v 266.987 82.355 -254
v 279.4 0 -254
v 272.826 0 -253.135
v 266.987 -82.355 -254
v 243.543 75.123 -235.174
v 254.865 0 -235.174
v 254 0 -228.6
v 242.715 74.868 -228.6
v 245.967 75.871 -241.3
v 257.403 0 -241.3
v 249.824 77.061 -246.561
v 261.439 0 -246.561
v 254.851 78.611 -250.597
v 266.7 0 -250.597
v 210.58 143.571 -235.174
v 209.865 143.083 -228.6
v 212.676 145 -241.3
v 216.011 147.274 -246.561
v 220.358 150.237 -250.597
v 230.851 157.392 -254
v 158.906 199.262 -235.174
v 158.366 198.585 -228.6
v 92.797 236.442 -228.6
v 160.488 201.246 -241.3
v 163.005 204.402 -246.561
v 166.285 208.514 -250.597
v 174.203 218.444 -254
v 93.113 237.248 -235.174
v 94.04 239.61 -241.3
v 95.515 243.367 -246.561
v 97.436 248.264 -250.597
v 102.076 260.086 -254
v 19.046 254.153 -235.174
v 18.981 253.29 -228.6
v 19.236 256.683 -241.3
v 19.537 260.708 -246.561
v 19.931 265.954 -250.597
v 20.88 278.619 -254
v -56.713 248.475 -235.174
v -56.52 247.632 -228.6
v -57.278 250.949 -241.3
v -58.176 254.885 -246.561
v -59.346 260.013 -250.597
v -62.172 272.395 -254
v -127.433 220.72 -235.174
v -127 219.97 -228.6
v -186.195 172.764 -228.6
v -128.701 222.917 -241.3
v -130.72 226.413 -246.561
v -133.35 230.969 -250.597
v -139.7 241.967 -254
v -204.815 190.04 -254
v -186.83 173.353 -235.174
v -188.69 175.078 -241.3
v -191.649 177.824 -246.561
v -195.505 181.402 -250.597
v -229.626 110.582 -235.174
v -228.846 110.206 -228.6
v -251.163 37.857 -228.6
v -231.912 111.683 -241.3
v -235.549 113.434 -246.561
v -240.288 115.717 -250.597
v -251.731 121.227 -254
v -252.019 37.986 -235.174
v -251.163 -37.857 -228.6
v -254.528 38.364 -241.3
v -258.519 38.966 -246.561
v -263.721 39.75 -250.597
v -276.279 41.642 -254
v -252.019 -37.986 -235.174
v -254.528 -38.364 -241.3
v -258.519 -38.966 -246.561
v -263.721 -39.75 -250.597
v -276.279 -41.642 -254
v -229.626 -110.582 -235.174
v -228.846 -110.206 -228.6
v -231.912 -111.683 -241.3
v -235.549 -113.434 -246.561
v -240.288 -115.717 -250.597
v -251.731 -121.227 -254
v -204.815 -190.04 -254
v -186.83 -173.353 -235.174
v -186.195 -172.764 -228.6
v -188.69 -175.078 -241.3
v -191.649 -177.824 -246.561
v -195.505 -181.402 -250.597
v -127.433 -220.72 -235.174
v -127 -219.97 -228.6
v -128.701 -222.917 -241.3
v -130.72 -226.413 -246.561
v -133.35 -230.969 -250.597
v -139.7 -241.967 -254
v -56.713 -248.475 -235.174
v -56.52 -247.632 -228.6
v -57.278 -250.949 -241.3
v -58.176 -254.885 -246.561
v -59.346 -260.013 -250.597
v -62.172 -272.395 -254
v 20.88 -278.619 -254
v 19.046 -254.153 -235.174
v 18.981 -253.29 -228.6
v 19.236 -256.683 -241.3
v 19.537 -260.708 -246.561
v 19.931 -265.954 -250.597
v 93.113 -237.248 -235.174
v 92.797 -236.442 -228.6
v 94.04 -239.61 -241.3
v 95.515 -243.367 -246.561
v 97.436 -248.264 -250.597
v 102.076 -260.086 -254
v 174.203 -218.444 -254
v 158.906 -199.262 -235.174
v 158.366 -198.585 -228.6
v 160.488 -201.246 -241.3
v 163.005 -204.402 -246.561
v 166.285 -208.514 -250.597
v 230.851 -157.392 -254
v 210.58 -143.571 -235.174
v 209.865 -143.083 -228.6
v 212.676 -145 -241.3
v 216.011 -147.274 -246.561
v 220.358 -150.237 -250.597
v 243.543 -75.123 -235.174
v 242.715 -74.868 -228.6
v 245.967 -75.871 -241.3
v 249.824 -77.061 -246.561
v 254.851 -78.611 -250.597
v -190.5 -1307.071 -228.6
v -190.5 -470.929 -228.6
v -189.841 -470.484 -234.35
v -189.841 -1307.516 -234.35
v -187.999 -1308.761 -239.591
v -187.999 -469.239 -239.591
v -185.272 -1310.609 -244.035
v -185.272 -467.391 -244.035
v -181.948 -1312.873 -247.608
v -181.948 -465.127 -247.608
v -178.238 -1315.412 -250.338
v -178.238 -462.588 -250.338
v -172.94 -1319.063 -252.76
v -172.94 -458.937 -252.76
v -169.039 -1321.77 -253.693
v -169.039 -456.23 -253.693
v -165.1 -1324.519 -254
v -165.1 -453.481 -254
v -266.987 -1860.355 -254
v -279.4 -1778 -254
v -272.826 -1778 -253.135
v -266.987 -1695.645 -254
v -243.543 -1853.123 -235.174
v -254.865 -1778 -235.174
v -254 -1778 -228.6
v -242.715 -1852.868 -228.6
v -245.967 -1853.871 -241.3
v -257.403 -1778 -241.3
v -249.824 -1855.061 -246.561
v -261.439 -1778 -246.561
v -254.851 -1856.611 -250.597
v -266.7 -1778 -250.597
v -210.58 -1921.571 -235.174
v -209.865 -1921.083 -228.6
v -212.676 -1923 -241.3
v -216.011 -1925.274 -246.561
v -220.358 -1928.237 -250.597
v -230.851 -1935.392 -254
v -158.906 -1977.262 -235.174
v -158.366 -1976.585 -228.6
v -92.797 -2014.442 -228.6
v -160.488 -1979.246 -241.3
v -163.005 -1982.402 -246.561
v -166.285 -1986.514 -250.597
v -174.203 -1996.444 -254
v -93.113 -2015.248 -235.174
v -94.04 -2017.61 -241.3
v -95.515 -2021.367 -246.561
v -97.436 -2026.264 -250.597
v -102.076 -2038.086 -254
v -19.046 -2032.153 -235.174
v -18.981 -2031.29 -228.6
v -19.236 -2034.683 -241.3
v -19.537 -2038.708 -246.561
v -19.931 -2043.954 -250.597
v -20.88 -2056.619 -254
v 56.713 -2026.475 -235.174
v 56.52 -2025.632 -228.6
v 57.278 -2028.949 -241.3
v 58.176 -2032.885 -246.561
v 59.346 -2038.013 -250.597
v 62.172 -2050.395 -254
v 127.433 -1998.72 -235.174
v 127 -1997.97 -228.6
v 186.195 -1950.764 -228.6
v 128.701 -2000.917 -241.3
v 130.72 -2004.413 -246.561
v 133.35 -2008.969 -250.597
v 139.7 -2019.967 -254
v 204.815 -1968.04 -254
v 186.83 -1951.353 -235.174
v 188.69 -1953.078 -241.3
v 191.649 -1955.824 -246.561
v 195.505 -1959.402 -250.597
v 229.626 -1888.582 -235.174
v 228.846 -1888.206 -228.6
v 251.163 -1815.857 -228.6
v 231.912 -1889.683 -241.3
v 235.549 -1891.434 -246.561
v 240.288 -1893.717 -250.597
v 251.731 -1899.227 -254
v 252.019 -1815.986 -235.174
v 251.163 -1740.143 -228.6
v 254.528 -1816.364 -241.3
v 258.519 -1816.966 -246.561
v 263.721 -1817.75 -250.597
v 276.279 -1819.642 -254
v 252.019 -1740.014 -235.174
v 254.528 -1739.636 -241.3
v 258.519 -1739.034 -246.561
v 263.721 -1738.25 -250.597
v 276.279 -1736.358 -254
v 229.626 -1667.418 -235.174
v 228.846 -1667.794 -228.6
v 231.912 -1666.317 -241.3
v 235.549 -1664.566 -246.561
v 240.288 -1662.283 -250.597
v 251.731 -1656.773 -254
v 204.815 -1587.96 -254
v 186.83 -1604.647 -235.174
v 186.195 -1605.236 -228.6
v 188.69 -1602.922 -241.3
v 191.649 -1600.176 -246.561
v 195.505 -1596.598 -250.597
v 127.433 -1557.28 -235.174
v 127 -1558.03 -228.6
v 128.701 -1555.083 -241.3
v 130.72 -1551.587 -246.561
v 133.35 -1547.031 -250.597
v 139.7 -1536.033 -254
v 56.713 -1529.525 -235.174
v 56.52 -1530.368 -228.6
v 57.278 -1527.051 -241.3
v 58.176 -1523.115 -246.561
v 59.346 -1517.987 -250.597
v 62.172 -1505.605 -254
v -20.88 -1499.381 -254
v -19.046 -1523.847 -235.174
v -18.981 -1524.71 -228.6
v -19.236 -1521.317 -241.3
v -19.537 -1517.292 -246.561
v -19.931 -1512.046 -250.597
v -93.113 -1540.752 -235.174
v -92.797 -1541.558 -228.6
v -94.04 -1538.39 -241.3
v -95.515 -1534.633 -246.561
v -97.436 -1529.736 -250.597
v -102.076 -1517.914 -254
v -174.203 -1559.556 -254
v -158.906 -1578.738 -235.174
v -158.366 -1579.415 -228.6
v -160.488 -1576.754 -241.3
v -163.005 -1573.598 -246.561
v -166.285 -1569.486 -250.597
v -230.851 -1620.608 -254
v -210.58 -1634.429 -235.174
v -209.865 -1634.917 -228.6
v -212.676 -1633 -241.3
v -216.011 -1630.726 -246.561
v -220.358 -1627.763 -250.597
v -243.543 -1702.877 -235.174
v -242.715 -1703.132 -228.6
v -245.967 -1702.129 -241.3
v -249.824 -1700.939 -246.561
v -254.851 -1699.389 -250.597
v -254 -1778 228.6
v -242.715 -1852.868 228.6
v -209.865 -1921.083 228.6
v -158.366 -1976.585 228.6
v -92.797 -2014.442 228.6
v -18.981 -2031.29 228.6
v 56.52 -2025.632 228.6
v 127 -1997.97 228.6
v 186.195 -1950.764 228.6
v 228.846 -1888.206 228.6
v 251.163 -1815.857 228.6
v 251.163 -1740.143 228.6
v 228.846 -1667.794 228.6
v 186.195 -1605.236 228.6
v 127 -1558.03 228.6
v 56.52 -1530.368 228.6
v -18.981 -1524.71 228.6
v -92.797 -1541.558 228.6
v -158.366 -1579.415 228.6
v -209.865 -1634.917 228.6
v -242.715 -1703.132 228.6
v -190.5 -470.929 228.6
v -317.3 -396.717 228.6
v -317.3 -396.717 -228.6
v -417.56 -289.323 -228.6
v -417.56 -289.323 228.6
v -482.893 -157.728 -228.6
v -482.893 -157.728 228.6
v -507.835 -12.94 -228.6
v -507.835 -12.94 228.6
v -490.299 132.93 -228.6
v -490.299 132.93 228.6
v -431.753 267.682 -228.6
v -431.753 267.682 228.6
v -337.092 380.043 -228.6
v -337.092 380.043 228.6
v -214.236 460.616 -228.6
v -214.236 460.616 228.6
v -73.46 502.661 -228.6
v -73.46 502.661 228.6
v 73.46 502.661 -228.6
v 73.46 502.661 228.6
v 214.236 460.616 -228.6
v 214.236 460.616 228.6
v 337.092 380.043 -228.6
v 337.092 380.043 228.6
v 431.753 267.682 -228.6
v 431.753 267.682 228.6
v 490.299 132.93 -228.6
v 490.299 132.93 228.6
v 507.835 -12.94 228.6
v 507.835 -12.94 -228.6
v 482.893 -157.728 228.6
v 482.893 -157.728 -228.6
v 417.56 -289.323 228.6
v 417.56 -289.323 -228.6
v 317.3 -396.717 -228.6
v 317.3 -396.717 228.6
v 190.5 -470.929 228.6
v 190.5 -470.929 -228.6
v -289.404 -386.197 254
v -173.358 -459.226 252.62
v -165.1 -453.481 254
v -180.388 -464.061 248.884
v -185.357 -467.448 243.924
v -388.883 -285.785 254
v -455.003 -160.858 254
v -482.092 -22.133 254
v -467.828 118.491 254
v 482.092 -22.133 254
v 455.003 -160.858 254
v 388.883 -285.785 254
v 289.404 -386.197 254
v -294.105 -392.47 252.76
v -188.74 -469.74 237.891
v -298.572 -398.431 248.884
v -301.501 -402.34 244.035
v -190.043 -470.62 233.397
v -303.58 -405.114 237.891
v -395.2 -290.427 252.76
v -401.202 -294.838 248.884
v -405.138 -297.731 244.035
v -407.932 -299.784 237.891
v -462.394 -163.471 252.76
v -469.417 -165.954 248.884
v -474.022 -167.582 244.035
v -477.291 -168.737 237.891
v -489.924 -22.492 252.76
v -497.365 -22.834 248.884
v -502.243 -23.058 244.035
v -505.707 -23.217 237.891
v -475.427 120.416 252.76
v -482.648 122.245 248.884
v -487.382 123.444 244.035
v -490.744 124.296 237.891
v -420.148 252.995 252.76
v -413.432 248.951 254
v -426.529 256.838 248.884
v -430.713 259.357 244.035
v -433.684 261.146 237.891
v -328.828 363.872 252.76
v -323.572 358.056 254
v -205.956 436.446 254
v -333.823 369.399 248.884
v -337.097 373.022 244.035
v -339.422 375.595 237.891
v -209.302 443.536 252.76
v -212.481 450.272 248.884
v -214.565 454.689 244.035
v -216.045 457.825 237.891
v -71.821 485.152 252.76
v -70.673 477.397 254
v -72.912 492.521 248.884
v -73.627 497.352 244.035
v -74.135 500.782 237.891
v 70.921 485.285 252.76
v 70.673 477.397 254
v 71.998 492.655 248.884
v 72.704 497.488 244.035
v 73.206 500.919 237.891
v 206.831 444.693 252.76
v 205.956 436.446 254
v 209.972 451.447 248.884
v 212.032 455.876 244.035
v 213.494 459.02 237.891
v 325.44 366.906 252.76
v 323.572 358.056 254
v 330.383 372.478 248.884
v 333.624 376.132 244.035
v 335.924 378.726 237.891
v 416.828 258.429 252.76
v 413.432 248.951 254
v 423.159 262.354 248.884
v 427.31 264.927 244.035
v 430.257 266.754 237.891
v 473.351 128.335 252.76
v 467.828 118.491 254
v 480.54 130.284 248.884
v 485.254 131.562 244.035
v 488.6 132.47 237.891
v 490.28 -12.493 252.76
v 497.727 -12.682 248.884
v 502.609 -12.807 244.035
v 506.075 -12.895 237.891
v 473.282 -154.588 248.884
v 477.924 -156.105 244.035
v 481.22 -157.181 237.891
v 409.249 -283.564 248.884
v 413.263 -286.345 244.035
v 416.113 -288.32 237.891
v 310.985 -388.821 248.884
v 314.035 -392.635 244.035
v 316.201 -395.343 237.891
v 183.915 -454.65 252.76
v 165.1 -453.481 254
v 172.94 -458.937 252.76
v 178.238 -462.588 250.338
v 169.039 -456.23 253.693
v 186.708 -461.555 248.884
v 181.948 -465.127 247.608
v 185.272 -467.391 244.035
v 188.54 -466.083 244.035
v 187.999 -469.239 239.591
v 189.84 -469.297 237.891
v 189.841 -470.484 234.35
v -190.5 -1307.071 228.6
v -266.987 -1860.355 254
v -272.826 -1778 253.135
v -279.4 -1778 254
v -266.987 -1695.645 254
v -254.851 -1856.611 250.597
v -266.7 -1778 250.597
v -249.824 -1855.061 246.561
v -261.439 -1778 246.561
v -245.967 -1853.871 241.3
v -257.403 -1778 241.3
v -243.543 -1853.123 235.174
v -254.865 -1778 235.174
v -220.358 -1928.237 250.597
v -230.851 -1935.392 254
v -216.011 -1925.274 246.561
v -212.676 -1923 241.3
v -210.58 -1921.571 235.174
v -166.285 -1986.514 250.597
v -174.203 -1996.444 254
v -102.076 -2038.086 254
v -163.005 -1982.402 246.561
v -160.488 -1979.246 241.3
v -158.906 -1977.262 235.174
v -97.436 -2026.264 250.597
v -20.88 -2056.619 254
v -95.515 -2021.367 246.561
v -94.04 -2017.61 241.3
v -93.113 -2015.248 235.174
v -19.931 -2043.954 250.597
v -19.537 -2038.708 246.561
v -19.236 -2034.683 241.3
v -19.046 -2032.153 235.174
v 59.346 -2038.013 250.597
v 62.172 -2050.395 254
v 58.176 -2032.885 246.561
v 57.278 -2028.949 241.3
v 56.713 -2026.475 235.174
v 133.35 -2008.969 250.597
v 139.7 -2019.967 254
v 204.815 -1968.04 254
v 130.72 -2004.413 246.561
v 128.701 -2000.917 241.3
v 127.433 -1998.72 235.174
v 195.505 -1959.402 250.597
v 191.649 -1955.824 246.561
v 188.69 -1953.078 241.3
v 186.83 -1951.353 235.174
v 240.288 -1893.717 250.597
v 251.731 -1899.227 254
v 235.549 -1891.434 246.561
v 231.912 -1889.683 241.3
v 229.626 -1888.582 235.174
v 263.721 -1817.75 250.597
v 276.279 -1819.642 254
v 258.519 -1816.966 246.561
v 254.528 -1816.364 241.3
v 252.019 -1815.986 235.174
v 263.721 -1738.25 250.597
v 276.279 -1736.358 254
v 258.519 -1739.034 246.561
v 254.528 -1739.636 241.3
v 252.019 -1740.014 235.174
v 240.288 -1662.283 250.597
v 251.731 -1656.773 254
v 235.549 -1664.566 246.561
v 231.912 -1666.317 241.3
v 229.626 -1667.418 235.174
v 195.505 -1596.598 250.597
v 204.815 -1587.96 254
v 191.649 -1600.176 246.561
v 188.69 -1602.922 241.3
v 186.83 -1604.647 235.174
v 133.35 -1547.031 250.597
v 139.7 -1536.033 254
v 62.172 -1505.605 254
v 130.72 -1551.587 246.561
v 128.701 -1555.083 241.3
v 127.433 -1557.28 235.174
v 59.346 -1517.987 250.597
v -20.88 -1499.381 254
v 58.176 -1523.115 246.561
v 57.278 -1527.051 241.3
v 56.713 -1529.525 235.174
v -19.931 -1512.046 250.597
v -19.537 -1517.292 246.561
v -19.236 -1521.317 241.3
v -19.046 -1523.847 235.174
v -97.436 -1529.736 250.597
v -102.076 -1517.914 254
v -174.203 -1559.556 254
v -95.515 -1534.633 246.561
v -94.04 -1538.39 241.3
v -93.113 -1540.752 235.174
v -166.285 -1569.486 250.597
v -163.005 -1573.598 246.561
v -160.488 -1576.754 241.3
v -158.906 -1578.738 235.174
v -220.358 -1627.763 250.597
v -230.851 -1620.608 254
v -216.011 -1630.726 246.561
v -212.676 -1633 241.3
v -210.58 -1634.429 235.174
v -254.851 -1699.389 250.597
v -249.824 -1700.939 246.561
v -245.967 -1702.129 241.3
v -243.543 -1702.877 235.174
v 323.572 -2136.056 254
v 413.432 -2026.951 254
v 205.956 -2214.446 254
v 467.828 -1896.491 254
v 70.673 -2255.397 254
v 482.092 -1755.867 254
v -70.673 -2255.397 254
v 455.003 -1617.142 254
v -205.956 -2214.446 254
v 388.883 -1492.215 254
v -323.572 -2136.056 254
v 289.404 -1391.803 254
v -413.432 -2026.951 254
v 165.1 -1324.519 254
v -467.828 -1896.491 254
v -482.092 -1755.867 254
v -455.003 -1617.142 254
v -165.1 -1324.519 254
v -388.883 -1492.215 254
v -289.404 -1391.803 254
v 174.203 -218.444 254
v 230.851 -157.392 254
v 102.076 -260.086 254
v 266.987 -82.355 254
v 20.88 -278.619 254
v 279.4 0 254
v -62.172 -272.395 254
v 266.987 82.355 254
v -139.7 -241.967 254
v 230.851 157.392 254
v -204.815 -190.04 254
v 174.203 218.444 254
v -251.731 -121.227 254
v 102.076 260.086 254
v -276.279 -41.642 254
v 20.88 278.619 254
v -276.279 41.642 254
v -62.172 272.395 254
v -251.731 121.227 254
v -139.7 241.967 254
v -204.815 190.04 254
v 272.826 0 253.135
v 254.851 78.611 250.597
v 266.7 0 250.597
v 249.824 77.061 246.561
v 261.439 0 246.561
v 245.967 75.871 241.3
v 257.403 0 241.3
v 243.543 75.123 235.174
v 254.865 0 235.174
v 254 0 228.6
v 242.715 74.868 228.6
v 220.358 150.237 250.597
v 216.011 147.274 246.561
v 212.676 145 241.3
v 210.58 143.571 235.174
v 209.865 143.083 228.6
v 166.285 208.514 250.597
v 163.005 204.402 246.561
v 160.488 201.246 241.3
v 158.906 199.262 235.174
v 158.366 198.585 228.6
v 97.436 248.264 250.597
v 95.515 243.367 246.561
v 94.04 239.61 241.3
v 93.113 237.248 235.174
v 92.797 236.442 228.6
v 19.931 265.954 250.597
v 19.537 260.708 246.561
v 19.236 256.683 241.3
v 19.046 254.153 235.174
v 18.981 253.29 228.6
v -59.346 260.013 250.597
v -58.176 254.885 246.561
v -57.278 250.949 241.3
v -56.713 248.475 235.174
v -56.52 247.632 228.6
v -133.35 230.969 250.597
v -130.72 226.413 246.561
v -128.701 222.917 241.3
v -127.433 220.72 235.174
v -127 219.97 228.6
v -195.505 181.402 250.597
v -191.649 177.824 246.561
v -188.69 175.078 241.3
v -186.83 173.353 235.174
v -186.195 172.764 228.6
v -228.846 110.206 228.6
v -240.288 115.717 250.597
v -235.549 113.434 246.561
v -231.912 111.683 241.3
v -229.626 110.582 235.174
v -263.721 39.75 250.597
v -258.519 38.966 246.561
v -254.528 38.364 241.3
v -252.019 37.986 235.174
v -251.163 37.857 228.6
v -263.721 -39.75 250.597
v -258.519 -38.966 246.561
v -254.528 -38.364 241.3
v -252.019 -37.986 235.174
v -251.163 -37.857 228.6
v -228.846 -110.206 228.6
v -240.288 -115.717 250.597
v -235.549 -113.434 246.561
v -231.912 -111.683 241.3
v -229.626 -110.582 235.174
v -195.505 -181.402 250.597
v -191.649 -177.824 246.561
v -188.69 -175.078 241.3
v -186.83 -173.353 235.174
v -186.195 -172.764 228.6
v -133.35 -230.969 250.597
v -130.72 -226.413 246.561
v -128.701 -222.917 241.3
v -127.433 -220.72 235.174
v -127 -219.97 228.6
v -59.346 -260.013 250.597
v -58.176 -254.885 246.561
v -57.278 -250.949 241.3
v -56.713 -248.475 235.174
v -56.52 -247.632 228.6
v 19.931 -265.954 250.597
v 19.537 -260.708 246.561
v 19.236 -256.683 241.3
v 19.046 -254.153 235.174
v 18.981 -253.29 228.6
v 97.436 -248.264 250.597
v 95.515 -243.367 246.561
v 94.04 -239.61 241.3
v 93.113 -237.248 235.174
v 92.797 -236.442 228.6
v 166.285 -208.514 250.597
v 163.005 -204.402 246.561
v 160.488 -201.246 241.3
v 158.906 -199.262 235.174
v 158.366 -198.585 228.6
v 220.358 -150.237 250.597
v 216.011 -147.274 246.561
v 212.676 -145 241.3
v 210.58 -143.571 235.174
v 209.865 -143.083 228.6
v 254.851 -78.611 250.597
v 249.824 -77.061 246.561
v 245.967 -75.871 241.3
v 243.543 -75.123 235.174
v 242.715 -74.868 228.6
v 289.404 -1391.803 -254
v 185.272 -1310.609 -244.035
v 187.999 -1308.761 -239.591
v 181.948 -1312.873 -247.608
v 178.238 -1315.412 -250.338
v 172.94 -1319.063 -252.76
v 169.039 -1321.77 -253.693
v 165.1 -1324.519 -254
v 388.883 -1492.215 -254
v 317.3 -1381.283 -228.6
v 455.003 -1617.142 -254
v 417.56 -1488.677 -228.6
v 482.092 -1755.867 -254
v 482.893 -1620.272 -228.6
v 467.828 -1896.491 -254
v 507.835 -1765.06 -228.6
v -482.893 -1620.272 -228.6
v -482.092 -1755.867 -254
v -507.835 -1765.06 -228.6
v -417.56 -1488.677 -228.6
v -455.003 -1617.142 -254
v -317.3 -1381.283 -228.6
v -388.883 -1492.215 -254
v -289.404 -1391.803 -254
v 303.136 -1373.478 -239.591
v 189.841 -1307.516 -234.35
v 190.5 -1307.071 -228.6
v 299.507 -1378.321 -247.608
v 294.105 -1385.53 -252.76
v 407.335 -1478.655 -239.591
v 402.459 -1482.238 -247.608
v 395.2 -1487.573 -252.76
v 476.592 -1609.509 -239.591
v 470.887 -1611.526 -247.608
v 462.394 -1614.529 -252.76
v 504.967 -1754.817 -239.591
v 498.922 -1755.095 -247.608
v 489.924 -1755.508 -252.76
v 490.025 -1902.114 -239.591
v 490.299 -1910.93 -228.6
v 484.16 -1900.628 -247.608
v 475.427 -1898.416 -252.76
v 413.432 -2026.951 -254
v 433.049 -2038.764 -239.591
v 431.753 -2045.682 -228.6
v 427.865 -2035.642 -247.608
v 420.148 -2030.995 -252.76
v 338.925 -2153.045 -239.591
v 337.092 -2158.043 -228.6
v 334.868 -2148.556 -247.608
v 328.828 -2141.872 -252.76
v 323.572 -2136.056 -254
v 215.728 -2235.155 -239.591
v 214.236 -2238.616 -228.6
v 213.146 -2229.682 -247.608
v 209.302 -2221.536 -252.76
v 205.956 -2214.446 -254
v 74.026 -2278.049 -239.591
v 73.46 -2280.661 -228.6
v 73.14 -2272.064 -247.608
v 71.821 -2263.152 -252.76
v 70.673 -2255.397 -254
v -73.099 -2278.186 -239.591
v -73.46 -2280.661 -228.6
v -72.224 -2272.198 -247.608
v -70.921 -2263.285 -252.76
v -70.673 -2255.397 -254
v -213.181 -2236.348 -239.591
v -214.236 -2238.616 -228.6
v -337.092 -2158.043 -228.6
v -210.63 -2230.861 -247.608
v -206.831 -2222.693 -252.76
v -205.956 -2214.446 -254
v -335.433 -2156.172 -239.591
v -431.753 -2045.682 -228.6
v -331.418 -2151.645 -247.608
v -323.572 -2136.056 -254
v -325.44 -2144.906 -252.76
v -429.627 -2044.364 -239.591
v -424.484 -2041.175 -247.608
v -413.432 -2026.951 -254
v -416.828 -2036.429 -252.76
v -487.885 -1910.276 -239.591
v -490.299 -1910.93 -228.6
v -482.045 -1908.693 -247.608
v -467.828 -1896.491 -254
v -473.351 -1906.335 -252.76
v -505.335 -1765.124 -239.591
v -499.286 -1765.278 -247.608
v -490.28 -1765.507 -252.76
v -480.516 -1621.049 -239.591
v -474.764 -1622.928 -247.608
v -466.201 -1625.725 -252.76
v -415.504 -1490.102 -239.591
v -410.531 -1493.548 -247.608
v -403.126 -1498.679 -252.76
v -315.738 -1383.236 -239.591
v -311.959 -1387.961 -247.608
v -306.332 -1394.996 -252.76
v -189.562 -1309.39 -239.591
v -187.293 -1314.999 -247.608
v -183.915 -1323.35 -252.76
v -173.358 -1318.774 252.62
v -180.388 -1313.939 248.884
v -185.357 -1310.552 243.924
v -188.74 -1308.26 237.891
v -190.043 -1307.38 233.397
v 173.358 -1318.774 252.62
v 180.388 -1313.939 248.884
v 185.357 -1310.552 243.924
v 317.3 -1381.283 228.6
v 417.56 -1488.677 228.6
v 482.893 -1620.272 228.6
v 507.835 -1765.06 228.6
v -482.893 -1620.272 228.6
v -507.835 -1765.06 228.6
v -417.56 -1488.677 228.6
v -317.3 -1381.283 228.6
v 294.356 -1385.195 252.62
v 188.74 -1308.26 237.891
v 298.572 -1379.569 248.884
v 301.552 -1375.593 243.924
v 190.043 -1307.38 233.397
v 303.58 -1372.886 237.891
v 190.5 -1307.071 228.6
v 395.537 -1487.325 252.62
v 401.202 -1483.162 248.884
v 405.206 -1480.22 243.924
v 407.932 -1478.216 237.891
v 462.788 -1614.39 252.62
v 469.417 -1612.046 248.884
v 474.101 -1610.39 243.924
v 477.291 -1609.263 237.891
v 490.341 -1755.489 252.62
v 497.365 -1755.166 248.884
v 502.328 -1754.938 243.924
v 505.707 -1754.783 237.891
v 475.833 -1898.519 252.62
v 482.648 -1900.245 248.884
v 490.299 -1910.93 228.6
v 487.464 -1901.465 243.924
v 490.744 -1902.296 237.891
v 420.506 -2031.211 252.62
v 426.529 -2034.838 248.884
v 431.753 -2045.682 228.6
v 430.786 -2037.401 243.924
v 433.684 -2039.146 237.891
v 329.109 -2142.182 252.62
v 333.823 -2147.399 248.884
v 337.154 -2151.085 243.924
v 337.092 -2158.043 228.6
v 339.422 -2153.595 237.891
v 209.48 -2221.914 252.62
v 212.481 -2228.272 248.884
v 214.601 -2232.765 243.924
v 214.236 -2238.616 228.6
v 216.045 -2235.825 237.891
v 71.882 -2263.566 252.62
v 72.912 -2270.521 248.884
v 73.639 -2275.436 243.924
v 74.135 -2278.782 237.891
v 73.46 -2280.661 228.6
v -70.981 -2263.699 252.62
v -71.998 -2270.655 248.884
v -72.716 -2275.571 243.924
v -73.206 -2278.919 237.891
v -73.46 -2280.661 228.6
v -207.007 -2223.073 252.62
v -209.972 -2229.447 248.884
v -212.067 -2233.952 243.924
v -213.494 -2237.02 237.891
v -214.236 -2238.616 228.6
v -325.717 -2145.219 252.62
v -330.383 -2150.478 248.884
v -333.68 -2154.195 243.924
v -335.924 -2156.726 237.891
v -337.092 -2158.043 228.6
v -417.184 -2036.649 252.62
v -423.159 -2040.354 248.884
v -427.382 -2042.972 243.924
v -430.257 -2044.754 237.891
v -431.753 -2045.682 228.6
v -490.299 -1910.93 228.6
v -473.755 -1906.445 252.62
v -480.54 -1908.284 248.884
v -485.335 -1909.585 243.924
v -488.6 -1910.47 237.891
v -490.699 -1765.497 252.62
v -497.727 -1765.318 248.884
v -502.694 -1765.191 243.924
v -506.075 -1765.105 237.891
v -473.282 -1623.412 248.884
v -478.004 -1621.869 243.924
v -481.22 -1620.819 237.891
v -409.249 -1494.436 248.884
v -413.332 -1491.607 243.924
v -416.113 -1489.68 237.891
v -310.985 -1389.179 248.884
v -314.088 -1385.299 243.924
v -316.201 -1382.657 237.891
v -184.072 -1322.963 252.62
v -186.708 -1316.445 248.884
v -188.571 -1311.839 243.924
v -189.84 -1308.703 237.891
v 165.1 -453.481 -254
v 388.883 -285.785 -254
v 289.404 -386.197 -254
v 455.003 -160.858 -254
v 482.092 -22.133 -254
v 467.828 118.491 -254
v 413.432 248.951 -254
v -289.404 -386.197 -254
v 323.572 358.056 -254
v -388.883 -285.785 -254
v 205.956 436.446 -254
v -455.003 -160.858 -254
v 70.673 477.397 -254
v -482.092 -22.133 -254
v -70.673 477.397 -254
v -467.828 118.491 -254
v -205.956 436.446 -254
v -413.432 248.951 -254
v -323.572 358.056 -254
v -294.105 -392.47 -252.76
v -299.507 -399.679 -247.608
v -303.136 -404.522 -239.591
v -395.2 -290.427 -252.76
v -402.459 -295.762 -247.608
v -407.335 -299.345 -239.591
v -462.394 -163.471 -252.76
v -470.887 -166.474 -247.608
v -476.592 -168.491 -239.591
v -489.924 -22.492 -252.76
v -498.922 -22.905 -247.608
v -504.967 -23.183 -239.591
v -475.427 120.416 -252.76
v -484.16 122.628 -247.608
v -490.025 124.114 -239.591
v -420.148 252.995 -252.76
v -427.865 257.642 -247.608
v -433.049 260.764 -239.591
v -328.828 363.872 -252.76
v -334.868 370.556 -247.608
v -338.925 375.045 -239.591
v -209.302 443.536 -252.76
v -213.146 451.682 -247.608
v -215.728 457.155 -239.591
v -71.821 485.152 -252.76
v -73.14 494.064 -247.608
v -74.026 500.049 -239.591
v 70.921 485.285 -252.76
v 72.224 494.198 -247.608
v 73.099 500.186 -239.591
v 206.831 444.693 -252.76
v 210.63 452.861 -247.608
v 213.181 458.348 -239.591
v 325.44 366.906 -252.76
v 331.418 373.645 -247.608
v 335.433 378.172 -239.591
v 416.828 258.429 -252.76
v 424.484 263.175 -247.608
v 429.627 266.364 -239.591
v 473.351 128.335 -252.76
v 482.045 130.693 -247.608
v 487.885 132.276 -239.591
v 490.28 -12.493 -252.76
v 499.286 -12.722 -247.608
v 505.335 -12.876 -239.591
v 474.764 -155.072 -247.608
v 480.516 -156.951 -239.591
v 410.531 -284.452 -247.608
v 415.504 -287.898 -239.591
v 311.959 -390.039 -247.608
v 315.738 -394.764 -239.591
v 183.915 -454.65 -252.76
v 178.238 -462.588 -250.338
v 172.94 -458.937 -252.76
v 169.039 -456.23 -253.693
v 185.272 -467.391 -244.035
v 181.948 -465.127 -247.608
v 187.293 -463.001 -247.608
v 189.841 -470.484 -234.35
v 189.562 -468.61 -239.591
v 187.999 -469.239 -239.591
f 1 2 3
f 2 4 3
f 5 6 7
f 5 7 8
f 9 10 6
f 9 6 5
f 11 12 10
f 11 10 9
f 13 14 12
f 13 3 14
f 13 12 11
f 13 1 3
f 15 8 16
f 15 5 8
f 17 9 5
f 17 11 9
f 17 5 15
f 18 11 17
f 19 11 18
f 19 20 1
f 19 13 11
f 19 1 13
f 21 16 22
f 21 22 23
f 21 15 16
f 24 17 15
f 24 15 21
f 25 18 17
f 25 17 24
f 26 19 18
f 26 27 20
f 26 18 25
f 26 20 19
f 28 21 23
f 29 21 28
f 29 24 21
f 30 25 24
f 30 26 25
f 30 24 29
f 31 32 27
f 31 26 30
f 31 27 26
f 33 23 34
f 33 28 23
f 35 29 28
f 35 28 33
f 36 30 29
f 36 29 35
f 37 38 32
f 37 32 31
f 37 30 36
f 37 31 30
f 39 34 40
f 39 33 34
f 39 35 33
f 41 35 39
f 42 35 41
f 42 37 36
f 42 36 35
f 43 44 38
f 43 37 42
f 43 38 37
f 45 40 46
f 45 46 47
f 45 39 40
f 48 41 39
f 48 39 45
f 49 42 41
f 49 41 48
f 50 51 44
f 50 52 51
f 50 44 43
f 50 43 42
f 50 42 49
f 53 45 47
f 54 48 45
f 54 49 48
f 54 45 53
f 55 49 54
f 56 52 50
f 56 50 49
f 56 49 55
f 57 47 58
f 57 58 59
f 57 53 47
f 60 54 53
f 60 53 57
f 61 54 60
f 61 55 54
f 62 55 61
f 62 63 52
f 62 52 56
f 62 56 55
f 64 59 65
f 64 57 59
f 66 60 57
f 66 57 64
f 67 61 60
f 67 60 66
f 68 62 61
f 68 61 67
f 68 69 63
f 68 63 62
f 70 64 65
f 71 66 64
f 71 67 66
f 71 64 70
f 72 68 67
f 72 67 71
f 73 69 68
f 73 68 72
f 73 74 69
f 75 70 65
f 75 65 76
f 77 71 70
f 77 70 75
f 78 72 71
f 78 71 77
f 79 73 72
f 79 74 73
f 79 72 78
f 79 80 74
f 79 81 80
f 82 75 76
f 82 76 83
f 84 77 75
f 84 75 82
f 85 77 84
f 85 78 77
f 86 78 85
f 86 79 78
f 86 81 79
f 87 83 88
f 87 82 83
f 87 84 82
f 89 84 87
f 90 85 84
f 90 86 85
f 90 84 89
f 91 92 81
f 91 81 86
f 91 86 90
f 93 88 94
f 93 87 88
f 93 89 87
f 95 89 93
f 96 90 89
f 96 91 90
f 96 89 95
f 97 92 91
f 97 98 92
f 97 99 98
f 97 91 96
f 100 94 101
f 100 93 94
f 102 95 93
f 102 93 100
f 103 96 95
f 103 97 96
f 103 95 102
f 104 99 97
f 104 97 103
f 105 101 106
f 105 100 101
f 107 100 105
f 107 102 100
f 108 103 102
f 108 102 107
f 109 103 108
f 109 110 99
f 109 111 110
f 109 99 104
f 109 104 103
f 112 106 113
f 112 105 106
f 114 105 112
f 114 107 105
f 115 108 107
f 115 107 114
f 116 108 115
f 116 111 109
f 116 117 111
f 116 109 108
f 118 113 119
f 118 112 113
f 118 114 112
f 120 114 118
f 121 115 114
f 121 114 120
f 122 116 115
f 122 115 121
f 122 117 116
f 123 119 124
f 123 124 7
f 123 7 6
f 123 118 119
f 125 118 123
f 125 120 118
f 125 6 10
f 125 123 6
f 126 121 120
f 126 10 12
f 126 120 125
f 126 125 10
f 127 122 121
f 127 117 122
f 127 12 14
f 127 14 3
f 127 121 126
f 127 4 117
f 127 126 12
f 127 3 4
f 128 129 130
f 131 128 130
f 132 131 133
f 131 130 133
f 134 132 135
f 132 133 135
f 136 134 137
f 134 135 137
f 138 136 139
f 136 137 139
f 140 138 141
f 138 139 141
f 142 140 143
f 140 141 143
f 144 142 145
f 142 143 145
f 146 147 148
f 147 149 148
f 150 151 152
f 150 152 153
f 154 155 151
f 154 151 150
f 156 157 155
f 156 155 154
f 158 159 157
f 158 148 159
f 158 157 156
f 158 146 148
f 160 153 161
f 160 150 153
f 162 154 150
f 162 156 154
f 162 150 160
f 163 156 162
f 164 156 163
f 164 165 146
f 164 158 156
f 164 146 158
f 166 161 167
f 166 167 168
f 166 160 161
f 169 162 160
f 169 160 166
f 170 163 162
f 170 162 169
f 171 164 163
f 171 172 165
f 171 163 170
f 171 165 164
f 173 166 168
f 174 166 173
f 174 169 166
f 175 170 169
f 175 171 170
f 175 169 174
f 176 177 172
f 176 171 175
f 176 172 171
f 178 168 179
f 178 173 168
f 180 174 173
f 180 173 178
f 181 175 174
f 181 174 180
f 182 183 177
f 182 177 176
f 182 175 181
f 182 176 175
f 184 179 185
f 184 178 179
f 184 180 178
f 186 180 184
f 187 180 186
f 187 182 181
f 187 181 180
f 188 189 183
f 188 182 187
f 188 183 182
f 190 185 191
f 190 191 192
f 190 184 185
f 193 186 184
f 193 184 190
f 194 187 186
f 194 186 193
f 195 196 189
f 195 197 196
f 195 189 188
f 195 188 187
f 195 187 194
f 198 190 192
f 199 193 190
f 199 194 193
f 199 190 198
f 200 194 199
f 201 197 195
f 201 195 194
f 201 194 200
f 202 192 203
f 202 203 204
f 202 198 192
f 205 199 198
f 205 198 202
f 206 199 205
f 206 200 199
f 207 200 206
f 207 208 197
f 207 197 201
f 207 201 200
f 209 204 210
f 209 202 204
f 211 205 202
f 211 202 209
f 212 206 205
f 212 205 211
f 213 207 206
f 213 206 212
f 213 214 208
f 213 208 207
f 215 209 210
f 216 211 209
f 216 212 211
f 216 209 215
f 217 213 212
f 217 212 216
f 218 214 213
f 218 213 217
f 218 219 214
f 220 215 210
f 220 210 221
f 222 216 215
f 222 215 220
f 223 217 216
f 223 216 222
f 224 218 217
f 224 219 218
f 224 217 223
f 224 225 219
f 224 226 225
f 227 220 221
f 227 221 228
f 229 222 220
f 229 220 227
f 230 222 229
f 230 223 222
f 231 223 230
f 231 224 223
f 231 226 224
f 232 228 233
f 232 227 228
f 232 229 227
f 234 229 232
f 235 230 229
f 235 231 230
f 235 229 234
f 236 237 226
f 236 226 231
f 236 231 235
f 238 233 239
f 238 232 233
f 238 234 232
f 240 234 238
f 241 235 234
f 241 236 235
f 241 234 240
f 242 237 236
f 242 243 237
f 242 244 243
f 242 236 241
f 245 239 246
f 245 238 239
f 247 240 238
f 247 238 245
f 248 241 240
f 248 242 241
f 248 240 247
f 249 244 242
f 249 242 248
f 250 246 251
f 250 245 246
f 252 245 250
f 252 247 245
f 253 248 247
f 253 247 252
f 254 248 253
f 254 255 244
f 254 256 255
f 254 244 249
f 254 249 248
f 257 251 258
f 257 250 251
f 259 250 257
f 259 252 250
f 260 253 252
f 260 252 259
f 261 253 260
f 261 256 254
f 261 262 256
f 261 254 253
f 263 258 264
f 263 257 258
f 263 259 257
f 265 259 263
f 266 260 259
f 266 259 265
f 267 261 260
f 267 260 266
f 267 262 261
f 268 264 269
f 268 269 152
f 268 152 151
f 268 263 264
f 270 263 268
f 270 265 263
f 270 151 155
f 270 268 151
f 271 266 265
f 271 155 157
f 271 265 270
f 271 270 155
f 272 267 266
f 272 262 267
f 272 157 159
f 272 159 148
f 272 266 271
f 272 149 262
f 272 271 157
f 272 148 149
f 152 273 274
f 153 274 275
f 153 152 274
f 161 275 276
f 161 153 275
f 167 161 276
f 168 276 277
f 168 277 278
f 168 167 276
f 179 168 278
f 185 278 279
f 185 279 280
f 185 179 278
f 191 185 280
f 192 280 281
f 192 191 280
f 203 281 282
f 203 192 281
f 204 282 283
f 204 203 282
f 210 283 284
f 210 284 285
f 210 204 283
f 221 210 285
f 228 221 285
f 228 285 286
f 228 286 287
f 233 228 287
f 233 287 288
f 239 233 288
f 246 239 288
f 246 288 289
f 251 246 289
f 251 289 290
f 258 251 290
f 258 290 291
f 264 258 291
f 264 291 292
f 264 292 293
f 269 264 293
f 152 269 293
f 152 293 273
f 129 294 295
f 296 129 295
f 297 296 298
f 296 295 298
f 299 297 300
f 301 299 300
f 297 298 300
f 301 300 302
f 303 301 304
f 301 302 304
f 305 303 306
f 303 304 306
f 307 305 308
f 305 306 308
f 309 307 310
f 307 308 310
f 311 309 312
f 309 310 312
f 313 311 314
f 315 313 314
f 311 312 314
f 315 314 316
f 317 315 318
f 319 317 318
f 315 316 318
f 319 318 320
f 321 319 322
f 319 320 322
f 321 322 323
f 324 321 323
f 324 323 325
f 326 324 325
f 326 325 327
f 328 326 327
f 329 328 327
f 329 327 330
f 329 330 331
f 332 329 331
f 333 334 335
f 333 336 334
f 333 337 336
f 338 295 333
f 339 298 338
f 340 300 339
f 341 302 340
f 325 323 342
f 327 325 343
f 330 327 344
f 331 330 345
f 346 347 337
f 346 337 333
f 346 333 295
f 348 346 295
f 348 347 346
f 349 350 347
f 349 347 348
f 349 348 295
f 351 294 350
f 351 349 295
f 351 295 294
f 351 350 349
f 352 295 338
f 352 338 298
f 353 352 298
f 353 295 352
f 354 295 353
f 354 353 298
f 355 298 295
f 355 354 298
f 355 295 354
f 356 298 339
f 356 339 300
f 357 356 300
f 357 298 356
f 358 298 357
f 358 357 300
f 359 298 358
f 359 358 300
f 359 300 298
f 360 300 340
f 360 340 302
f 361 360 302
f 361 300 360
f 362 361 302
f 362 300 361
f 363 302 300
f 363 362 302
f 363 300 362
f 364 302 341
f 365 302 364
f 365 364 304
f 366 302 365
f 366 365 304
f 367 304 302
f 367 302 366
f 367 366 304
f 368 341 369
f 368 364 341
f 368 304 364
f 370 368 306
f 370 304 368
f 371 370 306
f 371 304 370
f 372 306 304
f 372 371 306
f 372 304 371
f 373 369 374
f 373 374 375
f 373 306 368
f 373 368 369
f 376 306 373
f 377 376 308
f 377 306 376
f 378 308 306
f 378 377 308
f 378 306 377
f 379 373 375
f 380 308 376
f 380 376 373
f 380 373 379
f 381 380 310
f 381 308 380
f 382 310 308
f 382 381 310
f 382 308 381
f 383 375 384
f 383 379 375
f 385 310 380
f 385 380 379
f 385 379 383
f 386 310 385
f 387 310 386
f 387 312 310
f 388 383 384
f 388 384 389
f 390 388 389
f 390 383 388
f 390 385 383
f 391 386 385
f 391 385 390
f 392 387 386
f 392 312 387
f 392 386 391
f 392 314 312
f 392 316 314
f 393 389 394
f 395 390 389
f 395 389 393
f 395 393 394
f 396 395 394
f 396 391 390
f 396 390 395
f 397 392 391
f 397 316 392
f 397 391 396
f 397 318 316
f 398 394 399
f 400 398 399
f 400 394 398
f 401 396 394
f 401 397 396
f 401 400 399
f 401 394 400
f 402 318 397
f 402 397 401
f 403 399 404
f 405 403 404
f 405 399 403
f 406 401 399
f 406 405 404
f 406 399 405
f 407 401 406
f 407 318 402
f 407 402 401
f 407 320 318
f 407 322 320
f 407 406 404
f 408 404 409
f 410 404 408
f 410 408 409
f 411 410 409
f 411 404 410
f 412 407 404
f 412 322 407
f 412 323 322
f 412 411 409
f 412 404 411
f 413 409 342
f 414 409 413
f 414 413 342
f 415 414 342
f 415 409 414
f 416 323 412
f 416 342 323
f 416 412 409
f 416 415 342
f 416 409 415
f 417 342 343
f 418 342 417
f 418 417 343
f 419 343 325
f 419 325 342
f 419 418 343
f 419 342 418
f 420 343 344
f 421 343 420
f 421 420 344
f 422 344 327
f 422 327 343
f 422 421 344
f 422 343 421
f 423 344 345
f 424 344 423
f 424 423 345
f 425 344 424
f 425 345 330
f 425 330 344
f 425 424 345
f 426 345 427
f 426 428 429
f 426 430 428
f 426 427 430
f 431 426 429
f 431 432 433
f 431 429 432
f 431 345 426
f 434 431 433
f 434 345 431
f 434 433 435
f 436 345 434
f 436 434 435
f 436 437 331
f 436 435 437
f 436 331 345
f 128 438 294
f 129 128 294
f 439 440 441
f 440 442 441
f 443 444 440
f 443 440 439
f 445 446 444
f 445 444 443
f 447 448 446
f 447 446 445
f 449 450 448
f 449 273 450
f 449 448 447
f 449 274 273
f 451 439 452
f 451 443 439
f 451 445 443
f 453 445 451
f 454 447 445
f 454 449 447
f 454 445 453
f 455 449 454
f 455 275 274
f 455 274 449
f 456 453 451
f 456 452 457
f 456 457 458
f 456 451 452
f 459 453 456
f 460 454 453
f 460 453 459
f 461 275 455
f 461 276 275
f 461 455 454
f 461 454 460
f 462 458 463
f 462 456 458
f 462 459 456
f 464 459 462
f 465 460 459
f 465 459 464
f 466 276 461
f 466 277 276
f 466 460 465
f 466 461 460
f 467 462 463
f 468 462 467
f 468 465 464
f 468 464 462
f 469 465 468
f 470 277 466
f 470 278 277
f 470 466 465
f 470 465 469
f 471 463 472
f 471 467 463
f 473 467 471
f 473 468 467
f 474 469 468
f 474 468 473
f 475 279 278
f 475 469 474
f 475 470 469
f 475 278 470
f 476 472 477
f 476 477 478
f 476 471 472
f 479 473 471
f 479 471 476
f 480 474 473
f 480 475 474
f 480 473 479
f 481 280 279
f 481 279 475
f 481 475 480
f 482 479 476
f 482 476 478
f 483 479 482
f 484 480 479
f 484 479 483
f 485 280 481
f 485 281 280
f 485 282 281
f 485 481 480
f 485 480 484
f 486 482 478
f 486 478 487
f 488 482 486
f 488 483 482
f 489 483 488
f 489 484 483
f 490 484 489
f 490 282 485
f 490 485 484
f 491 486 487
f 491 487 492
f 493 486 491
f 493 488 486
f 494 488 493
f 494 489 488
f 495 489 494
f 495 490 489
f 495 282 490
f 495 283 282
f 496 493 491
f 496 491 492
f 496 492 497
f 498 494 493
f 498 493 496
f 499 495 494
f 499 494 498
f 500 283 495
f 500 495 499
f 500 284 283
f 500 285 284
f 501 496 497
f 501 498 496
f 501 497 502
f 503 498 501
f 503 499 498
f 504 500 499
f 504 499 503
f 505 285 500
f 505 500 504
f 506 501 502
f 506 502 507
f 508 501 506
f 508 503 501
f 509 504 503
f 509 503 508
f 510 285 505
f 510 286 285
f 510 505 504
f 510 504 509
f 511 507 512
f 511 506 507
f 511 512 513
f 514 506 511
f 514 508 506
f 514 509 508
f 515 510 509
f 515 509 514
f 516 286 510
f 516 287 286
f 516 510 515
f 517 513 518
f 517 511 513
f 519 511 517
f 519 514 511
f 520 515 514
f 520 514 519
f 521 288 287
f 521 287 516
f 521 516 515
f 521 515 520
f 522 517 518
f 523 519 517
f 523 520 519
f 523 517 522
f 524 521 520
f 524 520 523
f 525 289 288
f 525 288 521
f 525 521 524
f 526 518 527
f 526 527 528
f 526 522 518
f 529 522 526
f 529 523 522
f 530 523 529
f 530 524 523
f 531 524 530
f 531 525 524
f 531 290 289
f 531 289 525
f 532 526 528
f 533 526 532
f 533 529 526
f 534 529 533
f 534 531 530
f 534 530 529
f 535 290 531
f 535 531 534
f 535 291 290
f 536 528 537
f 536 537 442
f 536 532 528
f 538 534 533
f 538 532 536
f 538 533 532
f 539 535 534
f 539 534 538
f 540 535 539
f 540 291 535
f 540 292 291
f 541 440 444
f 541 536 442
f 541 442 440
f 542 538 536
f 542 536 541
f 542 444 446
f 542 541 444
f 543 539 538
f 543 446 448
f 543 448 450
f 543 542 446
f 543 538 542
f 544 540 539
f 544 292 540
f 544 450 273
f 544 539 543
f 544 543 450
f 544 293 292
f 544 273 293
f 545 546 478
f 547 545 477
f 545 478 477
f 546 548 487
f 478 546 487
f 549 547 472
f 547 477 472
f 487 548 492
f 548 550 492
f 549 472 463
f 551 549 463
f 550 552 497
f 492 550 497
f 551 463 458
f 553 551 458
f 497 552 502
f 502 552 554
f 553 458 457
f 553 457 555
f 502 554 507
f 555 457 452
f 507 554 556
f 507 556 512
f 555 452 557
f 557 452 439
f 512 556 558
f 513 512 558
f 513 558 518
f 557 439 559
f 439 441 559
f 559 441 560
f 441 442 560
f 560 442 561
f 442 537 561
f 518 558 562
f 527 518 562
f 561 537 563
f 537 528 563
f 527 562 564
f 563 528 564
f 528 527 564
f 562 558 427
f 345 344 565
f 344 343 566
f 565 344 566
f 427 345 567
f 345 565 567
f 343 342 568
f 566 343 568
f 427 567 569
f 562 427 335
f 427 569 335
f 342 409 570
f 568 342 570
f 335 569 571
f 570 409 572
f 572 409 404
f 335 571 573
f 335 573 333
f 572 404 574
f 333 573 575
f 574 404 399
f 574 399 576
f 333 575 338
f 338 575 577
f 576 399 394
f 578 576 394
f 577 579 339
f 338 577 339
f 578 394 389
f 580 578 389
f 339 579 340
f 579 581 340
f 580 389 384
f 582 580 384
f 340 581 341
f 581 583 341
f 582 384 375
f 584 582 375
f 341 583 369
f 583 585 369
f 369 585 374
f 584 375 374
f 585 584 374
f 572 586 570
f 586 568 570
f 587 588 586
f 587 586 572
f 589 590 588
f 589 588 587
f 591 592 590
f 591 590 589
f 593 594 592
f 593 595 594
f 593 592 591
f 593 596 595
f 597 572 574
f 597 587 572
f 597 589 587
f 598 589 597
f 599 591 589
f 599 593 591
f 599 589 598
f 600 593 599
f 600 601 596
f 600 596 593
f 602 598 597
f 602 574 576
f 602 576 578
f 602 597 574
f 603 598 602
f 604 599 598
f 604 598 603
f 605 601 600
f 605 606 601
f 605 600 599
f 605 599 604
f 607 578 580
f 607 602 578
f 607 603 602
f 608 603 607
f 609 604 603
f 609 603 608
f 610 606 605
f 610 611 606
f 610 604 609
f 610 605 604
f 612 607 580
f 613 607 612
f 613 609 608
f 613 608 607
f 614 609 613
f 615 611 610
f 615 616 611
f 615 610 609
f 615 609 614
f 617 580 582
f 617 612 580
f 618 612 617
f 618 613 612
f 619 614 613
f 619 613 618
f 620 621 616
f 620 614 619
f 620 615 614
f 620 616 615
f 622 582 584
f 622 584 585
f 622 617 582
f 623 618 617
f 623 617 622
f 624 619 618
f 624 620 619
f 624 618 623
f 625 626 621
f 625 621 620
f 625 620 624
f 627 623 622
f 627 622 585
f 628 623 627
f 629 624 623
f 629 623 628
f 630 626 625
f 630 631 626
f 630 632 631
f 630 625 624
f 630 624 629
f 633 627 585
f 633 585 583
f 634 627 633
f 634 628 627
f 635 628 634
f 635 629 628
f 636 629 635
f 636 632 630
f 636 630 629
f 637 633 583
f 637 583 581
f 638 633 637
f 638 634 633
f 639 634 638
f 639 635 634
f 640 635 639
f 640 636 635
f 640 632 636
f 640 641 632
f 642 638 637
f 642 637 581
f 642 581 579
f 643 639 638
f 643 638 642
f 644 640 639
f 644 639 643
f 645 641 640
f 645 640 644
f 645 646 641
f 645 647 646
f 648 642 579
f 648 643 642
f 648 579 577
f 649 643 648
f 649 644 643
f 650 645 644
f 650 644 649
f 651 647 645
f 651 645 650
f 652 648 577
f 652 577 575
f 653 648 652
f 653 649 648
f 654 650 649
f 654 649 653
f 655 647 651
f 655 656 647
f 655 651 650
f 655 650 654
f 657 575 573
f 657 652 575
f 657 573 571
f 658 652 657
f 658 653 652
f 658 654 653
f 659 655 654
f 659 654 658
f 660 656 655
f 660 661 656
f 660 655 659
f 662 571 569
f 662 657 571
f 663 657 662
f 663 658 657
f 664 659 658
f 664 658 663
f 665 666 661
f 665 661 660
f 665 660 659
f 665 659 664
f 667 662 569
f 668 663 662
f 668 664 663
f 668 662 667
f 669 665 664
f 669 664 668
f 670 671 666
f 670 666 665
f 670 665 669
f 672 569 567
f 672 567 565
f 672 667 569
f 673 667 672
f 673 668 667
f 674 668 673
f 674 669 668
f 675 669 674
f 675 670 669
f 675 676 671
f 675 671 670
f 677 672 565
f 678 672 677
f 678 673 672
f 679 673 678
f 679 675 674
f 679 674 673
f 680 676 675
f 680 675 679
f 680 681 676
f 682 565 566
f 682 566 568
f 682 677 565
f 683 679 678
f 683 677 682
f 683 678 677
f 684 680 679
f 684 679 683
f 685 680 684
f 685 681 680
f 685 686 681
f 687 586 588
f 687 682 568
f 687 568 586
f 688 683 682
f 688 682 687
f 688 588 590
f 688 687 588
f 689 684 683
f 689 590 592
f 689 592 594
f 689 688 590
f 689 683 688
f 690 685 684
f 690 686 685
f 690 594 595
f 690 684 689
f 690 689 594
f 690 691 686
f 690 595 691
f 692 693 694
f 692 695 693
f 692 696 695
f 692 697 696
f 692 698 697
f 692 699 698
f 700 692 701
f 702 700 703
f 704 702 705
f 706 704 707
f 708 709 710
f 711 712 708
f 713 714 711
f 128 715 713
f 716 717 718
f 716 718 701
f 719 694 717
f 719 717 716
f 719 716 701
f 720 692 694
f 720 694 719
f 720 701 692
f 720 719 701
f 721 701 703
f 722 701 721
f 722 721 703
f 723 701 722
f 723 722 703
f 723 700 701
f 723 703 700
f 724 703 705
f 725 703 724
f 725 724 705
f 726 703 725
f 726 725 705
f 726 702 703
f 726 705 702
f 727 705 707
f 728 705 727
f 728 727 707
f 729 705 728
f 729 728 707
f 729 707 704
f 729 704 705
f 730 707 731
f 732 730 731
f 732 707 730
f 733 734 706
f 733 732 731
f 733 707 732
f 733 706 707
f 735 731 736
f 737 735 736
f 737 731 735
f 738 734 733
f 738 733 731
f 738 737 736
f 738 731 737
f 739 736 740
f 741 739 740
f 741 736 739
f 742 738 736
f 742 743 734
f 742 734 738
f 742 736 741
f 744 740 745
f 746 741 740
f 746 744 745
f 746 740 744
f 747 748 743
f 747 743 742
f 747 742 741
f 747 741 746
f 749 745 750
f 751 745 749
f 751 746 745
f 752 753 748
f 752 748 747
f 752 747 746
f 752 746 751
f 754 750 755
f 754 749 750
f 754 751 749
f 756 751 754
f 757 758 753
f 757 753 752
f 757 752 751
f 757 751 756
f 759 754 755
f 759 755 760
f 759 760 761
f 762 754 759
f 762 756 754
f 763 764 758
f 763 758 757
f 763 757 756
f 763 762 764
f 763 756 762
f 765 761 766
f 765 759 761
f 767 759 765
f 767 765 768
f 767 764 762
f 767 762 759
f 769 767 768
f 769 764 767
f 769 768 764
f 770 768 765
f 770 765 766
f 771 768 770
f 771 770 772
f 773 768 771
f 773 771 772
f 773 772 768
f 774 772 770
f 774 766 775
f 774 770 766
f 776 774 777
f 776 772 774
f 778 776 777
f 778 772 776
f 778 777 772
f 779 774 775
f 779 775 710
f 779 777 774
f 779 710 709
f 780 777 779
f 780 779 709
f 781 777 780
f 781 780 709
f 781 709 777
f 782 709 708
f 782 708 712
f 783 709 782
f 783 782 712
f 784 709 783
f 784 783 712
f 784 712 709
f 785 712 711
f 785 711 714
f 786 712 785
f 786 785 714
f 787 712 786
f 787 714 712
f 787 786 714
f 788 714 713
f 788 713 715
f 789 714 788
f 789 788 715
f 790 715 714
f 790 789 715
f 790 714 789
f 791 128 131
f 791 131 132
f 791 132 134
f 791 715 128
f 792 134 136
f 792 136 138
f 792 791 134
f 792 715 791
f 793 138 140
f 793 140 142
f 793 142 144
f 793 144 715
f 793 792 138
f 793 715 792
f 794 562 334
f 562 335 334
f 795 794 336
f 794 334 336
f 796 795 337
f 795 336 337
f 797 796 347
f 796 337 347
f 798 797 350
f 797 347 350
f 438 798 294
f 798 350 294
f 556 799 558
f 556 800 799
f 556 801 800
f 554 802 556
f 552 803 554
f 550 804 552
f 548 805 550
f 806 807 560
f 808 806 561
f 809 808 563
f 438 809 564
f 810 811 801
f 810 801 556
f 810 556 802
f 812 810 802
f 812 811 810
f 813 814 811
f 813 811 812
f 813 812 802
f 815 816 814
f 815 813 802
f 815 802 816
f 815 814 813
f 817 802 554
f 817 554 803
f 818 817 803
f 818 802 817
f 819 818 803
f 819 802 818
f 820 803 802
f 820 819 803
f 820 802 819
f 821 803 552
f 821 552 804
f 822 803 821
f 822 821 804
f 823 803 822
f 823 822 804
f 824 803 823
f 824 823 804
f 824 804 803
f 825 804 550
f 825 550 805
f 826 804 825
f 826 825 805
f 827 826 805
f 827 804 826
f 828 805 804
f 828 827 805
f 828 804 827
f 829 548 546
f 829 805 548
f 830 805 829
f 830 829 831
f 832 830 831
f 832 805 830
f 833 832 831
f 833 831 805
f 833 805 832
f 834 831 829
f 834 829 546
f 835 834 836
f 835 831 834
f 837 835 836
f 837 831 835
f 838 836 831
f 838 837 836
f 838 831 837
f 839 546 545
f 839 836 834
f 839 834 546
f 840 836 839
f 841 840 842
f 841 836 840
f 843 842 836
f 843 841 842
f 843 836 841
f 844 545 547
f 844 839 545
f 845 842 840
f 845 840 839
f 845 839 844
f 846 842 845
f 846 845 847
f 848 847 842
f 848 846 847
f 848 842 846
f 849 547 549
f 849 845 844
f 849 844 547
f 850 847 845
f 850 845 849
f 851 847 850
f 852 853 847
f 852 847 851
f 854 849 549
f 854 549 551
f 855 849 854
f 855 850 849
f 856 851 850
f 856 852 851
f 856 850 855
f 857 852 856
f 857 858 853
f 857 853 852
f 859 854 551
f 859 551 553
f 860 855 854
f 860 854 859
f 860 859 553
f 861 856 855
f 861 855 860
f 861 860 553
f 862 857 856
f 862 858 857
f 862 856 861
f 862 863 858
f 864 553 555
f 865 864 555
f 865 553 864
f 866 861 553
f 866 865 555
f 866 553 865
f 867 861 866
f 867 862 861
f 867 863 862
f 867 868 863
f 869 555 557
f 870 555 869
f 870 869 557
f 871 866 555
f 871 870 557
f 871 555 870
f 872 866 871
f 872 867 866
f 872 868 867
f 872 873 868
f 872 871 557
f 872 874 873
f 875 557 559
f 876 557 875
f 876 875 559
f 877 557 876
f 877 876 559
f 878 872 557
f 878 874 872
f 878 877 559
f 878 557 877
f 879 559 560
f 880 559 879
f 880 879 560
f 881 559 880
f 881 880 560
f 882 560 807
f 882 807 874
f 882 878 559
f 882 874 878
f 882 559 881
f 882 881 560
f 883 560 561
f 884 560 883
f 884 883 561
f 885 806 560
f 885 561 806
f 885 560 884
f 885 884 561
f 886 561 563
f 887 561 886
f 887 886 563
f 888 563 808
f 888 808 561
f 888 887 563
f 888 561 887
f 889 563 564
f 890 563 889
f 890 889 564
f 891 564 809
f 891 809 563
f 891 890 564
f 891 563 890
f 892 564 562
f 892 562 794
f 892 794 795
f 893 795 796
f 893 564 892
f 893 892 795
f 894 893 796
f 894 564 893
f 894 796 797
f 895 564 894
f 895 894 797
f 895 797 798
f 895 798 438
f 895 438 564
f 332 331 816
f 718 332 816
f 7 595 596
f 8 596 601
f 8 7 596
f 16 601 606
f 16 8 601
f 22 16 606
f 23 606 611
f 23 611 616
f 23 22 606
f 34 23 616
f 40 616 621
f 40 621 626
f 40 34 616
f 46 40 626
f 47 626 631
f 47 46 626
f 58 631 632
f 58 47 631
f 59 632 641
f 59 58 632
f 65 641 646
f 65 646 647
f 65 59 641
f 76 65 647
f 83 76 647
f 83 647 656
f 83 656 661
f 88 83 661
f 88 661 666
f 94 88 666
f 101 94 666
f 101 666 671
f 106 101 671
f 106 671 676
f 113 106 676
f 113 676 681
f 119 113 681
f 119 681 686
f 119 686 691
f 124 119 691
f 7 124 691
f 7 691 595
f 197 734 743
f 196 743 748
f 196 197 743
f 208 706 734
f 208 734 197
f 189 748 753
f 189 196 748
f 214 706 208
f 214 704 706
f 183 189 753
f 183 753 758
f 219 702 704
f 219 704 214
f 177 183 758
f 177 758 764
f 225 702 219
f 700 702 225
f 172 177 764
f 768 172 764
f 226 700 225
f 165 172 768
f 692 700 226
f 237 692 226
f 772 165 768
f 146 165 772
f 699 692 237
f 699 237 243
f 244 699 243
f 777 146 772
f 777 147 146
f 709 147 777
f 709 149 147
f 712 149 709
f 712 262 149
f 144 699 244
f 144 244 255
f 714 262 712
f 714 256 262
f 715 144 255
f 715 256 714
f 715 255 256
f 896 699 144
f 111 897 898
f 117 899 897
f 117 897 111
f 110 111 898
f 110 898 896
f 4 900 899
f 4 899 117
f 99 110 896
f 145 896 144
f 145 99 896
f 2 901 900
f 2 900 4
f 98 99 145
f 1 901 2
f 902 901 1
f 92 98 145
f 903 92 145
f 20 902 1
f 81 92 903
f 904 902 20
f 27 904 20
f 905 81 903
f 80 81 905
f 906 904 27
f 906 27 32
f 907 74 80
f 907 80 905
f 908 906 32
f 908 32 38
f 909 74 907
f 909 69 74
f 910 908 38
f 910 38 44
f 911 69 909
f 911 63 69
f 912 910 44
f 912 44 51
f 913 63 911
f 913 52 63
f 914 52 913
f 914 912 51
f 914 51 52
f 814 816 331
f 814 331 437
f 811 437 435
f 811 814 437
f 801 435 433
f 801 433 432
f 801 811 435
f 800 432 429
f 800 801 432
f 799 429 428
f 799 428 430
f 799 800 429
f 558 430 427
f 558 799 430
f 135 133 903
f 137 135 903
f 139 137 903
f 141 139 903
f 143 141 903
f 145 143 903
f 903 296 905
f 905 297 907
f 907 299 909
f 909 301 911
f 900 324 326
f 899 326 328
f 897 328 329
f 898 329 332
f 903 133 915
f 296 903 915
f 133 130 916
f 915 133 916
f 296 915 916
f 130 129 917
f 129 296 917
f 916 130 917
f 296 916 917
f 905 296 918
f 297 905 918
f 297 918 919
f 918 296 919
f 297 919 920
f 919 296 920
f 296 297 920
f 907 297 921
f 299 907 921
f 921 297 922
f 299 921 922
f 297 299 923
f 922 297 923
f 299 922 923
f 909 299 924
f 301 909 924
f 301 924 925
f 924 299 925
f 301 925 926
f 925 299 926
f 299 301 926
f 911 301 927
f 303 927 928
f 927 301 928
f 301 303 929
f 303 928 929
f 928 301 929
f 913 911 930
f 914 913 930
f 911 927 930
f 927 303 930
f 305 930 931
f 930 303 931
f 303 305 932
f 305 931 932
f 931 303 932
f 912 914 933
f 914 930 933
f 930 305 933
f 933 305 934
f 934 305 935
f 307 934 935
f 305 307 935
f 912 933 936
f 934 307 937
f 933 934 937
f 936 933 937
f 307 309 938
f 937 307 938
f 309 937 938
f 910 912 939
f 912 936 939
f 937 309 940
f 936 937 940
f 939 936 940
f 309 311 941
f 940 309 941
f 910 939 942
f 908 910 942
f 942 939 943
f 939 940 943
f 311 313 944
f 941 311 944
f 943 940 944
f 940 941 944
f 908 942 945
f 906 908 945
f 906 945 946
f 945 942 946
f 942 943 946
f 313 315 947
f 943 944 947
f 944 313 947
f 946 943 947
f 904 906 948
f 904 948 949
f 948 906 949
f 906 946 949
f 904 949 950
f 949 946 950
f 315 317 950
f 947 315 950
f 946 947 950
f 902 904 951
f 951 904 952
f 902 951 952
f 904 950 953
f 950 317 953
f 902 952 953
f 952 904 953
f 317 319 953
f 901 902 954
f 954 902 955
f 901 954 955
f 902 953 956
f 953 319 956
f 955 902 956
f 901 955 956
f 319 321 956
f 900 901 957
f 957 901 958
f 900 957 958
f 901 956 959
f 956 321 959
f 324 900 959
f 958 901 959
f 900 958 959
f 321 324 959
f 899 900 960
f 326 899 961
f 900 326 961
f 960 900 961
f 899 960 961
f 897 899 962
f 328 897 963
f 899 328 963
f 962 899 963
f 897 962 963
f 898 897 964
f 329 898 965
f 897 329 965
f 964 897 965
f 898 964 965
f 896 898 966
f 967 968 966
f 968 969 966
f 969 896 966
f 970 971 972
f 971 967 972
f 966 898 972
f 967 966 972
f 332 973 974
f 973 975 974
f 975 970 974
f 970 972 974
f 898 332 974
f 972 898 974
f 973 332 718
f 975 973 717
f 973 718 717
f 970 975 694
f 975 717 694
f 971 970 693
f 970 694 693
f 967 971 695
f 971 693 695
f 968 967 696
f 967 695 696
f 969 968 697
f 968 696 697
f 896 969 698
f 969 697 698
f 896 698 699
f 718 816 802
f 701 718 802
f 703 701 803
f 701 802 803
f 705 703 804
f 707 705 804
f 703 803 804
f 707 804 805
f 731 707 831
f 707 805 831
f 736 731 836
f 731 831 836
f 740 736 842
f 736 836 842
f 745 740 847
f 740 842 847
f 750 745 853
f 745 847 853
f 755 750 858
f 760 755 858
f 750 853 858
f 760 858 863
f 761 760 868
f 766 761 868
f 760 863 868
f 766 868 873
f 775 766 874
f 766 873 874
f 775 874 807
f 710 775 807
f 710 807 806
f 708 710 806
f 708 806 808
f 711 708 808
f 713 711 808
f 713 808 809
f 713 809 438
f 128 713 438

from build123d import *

# Parameters (mm, degrees)
SKETCH1_R           = 254
BOSS_EXTRUDE1_DEPTH = 254
FILLET1_R           = 25.4


with BuildPart() as part:
    # Sketch1 → Boss-Extrude1 (new, symmetric)
    with BuildSketch(Plane.XY):
        with BuildLine():
            Line((190.5, -470.928603931), (190.5, -1307.071396069))
            ThreePointArc((190.5, -1307.071396069), (0, -2286), (-190.5, -1307.071396069))
            Line((-190.5, -1307.071396069), (-190.5, -470.928603931))
            ThreePointArc((-190.5, -470.928603931), (0, 508), (190.5, -470.928603931))
        make_face()
        Circle(SKETCH1_R, mode=Mode.SUBTRACT)
        with Locations(Location((0, -1778, 0), (0, 0, 180))):
            Circle(SKETCH1_R, mode=Mode.SUBTRACT)
    extrude(amount=BOSS_EXTRUDE1_DEPTH, both=True)

    # Fillet1
    fillet1_edges = [part.edges().sort_by_distance(p)[0] for p in [
        (0, -2286, 254),
        (-254, 0, -254),
        (-254, 0, 254),
        (190.5, -889, 254),
        (254, -1778, -254),
        (254, -1778, 254),
        (0, 508, 254),
        (190.5, -889, -254),
        (0, -2286, -254),
        (-190.5, -889, -254),
        (0, 508, -254),
        (-190.5, -889, 254),
    ]]
    fillet(fillet1_edges, radius=FILLET1_R - 0.0001)  # a hair under: the kernel refuses the full size


solid = part.part
